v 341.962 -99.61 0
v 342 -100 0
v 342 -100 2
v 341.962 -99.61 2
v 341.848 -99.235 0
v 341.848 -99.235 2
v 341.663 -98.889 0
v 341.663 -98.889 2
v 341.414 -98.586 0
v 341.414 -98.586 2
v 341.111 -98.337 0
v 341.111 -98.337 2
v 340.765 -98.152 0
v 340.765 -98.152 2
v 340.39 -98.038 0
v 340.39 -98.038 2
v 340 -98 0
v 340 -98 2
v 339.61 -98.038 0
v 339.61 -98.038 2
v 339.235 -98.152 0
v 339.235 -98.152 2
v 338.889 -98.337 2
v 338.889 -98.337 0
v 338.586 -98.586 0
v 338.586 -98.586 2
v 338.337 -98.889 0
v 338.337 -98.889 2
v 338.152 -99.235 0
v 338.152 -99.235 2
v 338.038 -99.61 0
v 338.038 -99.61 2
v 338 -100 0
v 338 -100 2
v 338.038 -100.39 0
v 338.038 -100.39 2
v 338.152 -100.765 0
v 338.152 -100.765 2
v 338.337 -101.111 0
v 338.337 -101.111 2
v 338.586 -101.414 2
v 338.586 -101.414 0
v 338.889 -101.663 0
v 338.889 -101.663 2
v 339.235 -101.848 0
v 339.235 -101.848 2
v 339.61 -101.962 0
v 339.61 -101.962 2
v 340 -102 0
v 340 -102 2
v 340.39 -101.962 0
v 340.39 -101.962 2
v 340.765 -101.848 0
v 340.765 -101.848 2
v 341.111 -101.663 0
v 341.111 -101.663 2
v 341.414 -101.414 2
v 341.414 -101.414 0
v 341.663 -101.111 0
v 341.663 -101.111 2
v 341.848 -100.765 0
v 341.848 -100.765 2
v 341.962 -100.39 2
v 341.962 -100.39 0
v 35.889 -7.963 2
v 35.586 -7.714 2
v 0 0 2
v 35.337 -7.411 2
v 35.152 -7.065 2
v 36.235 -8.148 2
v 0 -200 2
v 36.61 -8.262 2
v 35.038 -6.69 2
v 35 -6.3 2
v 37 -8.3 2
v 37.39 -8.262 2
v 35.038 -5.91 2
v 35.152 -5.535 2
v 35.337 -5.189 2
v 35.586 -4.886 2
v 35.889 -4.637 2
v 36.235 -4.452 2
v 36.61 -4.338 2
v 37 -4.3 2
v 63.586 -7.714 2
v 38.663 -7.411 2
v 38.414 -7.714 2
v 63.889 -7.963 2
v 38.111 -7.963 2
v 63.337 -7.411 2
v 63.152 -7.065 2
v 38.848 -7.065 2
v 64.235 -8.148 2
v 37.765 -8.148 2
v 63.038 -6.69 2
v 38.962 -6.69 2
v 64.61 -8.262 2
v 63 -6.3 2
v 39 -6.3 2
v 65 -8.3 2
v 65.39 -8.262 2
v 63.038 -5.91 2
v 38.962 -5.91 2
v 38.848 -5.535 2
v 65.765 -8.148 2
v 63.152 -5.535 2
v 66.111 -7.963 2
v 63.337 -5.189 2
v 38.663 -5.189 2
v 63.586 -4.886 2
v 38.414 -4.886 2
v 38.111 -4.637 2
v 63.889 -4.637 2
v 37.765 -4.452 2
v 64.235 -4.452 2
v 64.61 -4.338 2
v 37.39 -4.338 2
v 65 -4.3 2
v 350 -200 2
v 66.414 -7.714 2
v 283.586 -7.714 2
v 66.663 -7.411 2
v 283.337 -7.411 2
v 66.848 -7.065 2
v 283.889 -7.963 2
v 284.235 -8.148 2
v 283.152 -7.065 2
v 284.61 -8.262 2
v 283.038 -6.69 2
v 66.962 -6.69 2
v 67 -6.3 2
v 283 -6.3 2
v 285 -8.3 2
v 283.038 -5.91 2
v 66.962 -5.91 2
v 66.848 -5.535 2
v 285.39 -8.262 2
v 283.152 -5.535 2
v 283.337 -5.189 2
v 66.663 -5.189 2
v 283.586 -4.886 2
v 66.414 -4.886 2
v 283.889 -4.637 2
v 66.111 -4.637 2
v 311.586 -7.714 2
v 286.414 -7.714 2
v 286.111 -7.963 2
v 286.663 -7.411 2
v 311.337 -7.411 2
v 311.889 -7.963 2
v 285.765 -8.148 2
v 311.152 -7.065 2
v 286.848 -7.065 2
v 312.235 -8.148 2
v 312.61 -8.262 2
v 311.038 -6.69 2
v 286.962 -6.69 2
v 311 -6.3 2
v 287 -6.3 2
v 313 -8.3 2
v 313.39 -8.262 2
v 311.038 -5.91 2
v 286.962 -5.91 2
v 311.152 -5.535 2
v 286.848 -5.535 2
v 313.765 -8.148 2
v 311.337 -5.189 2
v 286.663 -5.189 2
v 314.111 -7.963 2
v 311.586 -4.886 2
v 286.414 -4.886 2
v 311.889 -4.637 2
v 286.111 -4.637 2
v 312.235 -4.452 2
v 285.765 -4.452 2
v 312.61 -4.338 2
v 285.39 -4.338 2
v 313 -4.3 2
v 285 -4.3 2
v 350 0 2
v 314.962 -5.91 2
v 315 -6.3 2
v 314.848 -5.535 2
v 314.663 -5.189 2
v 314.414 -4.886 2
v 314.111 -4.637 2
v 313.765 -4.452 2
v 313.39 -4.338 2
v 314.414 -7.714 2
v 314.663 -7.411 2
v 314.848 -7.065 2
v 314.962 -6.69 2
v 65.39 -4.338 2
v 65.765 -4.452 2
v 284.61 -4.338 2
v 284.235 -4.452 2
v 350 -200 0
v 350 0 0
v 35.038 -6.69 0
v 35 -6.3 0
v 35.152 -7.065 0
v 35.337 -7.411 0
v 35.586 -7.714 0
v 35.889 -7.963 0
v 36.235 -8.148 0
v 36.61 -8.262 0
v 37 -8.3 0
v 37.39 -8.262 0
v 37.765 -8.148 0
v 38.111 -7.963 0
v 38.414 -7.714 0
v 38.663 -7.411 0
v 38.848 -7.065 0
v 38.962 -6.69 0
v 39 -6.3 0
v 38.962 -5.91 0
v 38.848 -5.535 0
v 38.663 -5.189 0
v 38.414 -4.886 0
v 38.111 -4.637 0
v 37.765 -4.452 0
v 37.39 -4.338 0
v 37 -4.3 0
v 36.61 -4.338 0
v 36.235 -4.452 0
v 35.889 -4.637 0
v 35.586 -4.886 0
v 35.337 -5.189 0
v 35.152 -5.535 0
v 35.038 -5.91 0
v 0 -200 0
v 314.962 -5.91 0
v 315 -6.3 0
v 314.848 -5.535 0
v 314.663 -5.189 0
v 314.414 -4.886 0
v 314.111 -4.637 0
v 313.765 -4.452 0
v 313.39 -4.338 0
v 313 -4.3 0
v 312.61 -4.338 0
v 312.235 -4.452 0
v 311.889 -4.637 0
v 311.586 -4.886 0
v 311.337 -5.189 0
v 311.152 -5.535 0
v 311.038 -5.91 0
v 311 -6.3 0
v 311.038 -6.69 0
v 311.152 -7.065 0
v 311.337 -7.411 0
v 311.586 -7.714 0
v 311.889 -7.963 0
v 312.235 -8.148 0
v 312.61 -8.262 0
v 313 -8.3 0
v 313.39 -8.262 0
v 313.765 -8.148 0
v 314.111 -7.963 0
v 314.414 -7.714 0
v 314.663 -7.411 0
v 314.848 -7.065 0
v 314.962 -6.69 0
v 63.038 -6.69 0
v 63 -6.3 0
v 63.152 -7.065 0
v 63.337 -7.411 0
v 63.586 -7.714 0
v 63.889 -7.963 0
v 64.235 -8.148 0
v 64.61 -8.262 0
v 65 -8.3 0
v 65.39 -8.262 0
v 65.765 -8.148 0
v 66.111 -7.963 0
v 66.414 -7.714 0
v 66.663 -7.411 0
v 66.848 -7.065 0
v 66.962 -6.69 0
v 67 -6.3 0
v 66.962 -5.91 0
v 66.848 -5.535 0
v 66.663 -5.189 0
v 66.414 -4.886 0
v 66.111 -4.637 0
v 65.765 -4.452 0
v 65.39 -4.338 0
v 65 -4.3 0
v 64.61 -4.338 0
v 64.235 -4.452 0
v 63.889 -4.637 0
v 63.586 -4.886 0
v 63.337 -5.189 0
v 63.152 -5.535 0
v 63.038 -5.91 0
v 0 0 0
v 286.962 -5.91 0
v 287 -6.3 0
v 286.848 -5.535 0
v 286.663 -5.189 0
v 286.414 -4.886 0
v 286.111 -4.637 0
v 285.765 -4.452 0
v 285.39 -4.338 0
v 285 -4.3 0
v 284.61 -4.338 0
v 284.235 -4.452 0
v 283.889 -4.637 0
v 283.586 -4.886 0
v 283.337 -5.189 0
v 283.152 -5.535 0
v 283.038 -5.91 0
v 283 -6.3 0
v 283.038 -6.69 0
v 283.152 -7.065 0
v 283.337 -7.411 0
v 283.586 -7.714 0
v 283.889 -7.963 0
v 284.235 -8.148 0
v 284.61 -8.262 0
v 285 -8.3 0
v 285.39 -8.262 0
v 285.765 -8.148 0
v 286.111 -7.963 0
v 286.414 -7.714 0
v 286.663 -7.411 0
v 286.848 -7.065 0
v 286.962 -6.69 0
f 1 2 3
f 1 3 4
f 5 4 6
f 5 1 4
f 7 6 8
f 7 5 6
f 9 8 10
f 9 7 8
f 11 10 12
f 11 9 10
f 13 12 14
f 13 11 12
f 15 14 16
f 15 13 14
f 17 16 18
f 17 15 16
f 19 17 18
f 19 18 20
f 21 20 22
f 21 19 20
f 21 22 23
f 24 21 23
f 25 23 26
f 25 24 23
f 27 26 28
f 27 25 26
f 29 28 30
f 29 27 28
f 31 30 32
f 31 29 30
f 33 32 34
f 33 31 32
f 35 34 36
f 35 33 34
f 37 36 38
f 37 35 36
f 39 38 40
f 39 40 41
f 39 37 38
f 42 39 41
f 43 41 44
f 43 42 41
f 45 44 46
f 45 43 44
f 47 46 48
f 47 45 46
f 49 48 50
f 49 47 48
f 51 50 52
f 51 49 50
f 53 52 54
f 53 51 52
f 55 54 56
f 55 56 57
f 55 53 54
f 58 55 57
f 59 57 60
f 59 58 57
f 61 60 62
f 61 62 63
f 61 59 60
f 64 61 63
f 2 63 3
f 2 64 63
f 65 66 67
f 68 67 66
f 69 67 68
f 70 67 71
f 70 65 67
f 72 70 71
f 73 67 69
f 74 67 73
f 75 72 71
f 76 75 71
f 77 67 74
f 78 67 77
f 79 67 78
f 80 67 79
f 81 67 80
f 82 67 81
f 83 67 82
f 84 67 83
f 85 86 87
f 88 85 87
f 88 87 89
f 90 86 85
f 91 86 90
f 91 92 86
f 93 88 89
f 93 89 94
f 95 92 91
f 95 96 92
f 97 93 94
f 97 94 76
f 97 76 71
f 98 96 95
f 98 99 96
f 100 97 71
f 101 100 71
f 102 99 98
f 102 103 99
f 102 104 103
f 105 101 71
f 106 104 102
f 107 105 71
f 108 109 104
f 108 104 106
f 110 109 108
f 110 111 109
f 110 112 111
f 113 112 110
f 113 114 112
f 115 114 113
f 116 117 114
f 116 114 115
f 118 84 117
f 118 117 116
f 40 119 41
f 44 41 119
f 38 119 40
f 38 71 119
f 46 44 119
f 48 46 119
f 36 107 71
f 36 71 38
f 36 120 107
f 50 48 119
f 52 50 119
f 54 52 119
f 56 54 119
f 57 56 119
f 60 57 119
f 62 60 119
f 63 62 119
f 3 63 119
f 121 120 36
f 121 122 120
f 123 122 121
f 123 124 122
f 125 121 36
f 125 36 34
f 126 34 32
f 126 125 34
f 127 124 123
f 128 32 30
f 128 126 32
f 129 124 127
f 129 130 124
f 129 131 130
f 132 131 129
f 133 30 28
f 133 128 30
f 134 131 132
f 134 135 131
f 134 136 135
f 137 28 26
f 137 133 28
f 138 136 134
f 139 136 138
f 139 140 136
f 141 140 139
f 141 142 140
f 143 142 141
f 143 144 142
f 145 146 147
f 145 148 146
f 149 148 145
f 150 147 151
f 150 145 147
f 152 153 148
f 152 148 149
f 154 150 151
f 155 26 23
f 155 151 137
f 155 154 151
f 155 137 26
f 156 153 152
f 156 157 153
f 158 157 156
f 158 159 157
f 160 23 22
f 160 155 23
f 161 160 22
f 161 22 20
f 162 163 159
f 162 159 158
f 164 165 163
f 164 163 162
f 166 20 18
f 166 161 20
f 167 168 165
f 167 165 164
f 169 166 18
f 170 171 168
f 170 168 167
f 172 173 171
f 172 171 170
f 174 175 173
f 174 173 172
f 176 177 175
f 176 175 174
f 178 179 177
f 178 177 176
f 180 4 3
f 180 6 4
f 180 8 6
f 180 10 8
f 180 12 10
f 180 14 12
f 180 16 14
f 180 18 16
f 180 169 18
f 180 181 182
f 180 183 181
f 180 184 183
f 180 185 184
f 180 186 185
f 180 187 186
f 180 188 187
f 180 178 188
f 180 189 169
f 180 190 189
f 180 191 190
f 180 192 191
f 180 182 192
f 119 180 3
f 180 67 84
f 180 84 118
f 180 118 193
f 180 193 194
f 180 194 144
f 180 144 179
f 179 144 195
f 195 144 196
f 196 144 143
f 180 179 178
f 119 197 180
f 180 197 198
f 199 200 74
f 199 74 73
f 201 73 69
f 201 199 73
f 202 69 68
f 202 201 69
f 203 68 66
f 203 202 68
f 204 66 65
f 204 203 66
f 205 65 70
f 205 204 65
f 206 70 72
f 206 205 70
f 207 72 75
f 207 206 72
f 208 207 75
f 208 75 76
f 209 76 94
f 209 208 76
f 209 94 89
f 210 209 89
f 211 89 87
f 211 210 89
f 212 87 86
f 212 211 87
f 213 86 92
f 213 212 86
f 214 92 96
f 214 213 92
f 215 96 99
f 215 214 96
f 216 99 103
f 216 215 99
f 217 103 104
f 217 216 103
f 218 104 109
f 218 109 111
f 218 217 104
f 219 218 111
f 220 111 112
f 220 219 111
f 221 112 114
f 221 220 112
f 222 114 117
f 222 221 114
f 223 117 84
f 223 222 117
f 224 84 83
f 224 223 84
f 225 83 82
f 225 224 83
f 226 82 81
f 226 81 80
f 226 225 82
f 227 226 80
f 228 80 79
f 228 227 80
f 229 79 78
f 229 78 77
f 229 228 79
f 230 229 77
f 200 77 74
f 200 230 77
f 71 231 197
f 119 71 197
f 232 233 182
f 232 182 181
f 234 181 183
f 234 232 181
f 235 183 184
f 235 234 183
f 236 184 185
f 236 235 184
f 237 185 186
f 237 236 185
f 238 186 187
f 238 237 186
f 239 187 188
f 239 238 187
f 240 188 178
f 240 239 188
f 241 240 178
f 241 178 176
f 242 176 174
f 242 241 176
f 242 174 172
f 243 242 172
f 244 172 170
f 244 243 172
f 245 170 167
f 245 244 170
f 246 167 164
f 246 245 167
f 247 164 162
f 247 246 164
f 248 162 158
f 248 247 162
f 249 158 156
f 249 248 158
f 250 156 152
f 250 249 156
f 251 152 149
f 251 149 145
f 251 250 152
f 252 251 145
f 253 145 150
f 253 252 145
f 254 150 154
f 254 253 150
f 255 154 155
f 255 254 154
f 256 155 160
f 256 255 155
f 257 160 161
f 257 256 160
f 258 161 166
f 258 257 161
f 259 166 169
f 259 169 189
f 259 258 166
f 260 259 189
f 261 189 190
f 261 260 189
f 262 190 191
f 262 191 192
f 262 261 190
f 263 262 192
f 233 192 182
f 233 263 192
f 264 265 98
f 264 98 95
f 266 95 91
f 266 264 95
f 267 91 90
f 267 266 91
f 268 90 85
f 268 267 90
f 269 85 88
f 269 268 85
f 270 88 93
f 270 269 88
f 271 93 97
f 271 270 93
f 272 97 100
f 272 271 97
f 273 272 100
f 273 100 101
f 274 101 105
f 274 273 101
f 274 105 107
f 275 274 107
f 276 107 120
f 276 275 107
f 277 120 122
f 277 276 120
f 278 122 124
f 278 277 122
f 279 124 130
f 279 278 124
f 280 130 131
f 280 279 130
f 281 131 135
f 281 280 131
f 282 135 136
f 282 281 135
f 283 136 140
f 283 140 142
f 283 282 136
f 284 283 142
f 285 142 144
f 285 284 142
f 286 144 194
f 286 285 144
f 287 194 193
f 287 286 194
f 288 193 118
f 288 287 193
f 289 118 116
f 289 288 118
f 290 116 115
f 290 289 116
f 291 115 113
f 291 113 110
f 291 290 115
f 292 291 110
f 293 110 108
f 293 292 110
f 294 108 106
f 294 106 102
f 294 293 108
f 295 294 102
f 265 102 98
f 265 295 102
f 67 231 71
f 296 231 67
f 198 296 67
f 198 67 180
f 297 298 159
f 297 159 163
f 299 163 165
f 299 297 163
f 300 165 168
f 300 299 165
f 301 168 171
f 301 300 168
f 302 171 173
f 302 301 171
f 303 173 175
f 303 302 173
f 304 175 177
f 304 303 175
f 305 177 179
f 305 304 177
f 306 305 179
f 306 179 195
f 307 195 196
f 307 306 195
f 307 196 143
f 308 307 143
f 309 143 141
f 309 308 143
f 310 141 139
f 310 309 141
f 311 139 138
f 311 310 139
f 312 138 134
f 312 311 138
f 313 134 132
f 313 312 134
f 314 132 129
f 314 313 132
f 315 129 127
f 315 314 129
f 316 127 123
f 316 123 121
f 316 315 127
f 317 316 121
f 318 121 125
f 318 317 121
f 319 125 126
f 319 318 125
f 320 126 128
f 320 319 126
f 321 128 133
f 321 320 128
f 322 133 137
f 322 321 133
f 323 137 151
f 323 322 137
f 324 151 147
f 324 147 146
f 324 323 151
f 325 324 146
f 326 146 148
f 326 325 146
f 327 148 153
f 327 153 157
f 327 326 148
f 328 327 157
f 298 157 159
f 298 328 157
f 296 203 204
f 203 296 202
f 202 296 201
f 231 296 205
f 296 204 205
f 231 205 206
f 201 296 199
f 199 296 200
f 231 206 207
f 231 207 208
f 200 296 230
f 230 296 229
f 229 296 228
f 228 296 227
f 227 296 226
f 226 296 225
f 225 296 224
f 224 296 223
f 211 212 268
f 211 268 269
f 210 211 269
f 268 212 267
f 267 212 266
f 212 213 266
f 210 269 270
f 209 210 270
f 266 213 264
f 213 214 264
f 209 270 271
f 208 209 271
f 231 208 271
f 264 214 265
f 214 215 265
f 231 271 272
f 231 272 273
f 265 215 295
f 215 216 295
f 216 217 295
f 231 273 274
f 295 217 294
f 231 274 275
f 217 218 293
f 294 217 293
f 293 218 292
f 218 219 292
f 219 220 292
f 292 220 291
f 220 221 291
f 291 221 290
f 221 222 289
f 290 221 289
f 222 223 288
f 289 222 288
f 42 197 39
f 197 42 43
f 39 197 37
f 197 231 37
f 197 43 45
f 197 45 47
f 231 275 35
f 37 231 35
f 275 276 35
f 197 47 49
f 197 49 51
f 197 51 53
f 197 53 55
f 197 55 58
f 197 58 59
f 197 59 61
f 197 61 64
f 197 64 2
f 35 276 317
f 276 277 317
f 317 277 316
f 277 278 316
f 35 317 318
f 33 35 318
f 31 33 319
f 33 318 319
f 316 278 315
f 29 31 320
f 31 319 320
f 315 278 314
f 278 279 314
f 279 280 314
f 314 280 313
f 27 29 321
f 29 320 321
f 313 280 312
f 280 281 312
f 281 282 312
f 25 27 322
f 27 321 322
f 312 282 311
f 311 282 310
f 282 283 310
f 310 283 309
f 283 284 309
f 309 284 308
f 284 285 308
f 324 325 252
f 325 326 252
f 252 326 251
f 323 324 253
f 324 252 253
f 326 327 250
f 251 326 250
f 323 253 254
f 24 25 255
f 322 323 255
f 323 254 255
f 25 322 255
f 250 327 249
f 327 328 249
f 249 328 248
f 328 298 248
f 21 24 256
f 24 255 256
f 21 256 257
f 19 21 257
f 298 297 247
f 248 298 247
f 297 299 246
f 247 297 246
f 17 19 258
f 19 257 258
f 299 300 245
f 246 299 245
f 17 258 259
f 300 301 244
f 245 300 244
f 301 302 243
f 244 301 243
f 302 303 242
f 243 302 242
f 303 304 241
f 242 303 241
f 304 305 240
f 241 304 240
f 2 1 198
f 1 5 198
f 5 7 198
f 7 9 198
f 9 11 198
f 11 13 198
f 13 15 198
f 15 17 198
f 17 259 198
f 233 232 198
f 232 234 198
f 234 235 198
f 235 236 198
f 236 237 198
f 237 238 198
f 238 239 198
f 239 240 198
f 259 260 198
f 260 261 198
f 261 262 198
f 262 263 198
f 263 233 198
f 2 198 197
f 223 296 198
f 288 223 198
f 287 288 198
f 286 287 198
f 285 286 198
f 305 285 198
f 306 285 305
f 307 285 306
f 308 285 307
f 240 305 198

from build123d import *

# Parameters (mm, degrees)
SKETCH_1_W      = 350
SKETCH_1_H      = 200
SKETCH_1_R      = 2
EXTRUDE_1_DEPTH = 2


with BuildPart() as part:
    # 草图1 → 凸台-拉伸1 (new body)
    with BuildSketch(Plane.XY):
        with Locations((175, -100)):
            Rectangle(SKETCH_1_W, SKETCH_1_H)
        with Locations((340, -100)):
            Circle(SKETCH_1_R, mode=Mode.SUBTRACT)
        with Locations((285, -6.3)):
            Circle(SKETCH_1_R, mode=Mode.SUBTRACT)
        with Locations((313, -6.3)):
            Circle(SKETCH_1_R, mode=Mode.SUBTRACT)
        with Locations(Location((37, -6.3, 0), (0, 0, 180))):
            Circle(SKETCH_1_R, mode=Mode.SUBTRACT)
        with Locations(Location((65, -6.3, 0), (0, 0, 180))):
            Circle(SKETCH_1_R, mode=Mode.SUBTRACT)
    extrude(amount=EXTRUDE_1_DEPTH)


solid = part.part
